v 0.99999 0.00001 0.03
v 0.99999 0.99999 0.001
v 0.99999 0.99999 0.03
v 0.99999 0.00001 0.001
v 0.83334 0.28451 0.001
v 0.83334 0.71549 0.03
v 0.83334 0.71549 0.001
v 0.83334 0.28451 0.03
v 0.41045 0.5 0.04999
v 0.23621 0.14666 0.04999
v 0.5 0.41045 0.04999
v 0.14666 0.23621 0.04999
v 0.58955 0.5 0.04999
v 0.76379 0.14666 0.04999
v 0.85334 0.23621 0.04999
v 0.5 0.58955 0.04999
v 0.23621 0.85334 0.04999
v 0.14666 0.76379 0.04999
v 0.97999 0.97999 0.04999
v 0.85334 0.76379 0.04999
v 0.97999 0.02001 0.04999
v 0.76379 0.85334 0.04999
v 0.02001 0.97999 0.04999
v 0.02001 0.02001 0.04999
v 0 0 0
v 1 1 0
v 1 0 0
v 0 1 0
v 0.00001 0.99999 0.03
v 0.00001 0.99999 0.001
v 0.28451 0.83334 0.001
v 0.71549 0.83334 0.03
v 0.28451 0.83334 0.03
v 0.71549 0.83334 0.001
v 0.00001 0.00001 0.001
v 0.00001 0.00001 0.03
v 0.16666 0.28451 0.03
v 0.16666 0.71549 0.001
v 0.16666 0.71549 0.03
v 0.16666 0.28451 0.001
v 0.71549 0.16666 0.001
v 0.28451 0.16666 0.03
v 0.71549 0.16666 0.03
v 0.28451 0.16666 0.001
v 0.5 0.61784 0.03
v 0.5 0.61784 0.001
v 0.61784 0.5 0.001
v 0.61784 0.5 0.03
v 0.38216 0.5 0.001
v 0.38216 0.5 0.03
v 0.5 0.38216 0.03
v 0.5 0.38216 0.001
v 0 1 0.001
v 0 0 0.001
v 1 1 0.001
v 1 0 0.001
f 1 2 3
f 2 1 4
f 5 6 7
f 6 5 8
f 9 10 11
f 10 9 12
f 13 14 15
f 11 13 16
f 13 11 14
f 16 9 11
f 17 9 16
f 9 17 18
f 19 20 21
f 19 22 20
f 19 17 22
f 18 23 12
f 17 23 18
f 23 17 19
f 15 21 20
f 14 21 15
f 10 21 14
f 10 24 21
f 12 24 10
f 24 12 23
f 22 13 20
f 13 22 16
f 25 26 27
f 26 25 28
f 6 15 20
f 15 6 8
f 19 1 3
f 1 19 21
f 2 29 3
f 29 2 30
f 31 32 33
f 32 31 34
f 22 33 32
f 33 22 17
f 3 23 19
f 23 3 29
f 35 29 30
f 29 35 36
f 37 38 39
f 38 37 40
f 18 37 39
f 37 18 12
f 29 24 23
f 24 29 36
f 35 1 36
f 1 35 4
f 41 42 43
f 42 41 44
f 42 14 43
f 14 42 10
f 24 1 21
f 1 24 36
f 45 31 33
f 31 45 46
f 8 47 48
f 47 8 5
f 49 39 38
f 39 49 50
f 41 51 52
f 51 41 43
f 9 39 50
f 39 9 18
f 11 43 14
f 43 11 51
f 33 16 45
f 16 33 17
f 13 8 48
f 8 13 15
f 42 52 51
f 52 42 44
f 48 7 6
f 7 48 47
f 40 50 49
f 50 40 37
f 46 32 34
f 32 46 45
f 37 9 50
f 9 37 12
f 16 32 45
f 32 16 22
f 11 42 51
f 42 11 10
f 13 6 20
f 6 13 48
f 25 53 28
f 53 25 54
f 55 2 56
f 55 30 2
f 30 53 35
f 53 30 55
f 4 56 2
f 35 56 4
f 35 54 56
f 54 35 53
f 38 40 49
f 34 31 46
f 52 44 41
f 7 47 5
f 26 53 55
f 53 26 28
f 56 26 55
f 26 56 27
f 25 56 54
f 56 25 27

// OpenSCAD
module theBox(){
  box_color=[0.6,0.2,0];
  plank_width=1/6;
  plank_height=0.05;
  plank_cut=0.02;
  
  module plank(length=1){
    rotate([90,0,0])
    linear_extrude(length,center=true)
    polygon([[-plank_width/2,0],
             [plank_width/2,0],
             [plank_width/2,plank_height-plank_cut],
             [plank_width/2-plank_cut,plank_height],
             [-(plank_width/2-plank_cut),plank_height],
             [-plank_width/2,plank_height-plank_cut]]
    );
  }
  
  module face(){
    difference(){
      union(){
        // Borders
        for(i=[0:90:270]){
          rotate([0,0,i])
          intersection(){
            translate([0.5-plank_width/2,0,0]) plank(1);
            rotate([0,0,-45]) linear_extrude(2,center=true) polygon([[0,0],[0,1.5],[1.5,0]]);
          }
        }
        // Diagonals
        rotate([0,0,45]) plank(1);
        rotate([0,0,-45]) plank(1);
        // Background
        linear_extrude(0.001)
        square(1,center=true);
      }
    }
  }
  
  color(box_color)
  render(convexity=10)
  translate([0.5,0.5,0]){
    face();
  }
}

theBox();
